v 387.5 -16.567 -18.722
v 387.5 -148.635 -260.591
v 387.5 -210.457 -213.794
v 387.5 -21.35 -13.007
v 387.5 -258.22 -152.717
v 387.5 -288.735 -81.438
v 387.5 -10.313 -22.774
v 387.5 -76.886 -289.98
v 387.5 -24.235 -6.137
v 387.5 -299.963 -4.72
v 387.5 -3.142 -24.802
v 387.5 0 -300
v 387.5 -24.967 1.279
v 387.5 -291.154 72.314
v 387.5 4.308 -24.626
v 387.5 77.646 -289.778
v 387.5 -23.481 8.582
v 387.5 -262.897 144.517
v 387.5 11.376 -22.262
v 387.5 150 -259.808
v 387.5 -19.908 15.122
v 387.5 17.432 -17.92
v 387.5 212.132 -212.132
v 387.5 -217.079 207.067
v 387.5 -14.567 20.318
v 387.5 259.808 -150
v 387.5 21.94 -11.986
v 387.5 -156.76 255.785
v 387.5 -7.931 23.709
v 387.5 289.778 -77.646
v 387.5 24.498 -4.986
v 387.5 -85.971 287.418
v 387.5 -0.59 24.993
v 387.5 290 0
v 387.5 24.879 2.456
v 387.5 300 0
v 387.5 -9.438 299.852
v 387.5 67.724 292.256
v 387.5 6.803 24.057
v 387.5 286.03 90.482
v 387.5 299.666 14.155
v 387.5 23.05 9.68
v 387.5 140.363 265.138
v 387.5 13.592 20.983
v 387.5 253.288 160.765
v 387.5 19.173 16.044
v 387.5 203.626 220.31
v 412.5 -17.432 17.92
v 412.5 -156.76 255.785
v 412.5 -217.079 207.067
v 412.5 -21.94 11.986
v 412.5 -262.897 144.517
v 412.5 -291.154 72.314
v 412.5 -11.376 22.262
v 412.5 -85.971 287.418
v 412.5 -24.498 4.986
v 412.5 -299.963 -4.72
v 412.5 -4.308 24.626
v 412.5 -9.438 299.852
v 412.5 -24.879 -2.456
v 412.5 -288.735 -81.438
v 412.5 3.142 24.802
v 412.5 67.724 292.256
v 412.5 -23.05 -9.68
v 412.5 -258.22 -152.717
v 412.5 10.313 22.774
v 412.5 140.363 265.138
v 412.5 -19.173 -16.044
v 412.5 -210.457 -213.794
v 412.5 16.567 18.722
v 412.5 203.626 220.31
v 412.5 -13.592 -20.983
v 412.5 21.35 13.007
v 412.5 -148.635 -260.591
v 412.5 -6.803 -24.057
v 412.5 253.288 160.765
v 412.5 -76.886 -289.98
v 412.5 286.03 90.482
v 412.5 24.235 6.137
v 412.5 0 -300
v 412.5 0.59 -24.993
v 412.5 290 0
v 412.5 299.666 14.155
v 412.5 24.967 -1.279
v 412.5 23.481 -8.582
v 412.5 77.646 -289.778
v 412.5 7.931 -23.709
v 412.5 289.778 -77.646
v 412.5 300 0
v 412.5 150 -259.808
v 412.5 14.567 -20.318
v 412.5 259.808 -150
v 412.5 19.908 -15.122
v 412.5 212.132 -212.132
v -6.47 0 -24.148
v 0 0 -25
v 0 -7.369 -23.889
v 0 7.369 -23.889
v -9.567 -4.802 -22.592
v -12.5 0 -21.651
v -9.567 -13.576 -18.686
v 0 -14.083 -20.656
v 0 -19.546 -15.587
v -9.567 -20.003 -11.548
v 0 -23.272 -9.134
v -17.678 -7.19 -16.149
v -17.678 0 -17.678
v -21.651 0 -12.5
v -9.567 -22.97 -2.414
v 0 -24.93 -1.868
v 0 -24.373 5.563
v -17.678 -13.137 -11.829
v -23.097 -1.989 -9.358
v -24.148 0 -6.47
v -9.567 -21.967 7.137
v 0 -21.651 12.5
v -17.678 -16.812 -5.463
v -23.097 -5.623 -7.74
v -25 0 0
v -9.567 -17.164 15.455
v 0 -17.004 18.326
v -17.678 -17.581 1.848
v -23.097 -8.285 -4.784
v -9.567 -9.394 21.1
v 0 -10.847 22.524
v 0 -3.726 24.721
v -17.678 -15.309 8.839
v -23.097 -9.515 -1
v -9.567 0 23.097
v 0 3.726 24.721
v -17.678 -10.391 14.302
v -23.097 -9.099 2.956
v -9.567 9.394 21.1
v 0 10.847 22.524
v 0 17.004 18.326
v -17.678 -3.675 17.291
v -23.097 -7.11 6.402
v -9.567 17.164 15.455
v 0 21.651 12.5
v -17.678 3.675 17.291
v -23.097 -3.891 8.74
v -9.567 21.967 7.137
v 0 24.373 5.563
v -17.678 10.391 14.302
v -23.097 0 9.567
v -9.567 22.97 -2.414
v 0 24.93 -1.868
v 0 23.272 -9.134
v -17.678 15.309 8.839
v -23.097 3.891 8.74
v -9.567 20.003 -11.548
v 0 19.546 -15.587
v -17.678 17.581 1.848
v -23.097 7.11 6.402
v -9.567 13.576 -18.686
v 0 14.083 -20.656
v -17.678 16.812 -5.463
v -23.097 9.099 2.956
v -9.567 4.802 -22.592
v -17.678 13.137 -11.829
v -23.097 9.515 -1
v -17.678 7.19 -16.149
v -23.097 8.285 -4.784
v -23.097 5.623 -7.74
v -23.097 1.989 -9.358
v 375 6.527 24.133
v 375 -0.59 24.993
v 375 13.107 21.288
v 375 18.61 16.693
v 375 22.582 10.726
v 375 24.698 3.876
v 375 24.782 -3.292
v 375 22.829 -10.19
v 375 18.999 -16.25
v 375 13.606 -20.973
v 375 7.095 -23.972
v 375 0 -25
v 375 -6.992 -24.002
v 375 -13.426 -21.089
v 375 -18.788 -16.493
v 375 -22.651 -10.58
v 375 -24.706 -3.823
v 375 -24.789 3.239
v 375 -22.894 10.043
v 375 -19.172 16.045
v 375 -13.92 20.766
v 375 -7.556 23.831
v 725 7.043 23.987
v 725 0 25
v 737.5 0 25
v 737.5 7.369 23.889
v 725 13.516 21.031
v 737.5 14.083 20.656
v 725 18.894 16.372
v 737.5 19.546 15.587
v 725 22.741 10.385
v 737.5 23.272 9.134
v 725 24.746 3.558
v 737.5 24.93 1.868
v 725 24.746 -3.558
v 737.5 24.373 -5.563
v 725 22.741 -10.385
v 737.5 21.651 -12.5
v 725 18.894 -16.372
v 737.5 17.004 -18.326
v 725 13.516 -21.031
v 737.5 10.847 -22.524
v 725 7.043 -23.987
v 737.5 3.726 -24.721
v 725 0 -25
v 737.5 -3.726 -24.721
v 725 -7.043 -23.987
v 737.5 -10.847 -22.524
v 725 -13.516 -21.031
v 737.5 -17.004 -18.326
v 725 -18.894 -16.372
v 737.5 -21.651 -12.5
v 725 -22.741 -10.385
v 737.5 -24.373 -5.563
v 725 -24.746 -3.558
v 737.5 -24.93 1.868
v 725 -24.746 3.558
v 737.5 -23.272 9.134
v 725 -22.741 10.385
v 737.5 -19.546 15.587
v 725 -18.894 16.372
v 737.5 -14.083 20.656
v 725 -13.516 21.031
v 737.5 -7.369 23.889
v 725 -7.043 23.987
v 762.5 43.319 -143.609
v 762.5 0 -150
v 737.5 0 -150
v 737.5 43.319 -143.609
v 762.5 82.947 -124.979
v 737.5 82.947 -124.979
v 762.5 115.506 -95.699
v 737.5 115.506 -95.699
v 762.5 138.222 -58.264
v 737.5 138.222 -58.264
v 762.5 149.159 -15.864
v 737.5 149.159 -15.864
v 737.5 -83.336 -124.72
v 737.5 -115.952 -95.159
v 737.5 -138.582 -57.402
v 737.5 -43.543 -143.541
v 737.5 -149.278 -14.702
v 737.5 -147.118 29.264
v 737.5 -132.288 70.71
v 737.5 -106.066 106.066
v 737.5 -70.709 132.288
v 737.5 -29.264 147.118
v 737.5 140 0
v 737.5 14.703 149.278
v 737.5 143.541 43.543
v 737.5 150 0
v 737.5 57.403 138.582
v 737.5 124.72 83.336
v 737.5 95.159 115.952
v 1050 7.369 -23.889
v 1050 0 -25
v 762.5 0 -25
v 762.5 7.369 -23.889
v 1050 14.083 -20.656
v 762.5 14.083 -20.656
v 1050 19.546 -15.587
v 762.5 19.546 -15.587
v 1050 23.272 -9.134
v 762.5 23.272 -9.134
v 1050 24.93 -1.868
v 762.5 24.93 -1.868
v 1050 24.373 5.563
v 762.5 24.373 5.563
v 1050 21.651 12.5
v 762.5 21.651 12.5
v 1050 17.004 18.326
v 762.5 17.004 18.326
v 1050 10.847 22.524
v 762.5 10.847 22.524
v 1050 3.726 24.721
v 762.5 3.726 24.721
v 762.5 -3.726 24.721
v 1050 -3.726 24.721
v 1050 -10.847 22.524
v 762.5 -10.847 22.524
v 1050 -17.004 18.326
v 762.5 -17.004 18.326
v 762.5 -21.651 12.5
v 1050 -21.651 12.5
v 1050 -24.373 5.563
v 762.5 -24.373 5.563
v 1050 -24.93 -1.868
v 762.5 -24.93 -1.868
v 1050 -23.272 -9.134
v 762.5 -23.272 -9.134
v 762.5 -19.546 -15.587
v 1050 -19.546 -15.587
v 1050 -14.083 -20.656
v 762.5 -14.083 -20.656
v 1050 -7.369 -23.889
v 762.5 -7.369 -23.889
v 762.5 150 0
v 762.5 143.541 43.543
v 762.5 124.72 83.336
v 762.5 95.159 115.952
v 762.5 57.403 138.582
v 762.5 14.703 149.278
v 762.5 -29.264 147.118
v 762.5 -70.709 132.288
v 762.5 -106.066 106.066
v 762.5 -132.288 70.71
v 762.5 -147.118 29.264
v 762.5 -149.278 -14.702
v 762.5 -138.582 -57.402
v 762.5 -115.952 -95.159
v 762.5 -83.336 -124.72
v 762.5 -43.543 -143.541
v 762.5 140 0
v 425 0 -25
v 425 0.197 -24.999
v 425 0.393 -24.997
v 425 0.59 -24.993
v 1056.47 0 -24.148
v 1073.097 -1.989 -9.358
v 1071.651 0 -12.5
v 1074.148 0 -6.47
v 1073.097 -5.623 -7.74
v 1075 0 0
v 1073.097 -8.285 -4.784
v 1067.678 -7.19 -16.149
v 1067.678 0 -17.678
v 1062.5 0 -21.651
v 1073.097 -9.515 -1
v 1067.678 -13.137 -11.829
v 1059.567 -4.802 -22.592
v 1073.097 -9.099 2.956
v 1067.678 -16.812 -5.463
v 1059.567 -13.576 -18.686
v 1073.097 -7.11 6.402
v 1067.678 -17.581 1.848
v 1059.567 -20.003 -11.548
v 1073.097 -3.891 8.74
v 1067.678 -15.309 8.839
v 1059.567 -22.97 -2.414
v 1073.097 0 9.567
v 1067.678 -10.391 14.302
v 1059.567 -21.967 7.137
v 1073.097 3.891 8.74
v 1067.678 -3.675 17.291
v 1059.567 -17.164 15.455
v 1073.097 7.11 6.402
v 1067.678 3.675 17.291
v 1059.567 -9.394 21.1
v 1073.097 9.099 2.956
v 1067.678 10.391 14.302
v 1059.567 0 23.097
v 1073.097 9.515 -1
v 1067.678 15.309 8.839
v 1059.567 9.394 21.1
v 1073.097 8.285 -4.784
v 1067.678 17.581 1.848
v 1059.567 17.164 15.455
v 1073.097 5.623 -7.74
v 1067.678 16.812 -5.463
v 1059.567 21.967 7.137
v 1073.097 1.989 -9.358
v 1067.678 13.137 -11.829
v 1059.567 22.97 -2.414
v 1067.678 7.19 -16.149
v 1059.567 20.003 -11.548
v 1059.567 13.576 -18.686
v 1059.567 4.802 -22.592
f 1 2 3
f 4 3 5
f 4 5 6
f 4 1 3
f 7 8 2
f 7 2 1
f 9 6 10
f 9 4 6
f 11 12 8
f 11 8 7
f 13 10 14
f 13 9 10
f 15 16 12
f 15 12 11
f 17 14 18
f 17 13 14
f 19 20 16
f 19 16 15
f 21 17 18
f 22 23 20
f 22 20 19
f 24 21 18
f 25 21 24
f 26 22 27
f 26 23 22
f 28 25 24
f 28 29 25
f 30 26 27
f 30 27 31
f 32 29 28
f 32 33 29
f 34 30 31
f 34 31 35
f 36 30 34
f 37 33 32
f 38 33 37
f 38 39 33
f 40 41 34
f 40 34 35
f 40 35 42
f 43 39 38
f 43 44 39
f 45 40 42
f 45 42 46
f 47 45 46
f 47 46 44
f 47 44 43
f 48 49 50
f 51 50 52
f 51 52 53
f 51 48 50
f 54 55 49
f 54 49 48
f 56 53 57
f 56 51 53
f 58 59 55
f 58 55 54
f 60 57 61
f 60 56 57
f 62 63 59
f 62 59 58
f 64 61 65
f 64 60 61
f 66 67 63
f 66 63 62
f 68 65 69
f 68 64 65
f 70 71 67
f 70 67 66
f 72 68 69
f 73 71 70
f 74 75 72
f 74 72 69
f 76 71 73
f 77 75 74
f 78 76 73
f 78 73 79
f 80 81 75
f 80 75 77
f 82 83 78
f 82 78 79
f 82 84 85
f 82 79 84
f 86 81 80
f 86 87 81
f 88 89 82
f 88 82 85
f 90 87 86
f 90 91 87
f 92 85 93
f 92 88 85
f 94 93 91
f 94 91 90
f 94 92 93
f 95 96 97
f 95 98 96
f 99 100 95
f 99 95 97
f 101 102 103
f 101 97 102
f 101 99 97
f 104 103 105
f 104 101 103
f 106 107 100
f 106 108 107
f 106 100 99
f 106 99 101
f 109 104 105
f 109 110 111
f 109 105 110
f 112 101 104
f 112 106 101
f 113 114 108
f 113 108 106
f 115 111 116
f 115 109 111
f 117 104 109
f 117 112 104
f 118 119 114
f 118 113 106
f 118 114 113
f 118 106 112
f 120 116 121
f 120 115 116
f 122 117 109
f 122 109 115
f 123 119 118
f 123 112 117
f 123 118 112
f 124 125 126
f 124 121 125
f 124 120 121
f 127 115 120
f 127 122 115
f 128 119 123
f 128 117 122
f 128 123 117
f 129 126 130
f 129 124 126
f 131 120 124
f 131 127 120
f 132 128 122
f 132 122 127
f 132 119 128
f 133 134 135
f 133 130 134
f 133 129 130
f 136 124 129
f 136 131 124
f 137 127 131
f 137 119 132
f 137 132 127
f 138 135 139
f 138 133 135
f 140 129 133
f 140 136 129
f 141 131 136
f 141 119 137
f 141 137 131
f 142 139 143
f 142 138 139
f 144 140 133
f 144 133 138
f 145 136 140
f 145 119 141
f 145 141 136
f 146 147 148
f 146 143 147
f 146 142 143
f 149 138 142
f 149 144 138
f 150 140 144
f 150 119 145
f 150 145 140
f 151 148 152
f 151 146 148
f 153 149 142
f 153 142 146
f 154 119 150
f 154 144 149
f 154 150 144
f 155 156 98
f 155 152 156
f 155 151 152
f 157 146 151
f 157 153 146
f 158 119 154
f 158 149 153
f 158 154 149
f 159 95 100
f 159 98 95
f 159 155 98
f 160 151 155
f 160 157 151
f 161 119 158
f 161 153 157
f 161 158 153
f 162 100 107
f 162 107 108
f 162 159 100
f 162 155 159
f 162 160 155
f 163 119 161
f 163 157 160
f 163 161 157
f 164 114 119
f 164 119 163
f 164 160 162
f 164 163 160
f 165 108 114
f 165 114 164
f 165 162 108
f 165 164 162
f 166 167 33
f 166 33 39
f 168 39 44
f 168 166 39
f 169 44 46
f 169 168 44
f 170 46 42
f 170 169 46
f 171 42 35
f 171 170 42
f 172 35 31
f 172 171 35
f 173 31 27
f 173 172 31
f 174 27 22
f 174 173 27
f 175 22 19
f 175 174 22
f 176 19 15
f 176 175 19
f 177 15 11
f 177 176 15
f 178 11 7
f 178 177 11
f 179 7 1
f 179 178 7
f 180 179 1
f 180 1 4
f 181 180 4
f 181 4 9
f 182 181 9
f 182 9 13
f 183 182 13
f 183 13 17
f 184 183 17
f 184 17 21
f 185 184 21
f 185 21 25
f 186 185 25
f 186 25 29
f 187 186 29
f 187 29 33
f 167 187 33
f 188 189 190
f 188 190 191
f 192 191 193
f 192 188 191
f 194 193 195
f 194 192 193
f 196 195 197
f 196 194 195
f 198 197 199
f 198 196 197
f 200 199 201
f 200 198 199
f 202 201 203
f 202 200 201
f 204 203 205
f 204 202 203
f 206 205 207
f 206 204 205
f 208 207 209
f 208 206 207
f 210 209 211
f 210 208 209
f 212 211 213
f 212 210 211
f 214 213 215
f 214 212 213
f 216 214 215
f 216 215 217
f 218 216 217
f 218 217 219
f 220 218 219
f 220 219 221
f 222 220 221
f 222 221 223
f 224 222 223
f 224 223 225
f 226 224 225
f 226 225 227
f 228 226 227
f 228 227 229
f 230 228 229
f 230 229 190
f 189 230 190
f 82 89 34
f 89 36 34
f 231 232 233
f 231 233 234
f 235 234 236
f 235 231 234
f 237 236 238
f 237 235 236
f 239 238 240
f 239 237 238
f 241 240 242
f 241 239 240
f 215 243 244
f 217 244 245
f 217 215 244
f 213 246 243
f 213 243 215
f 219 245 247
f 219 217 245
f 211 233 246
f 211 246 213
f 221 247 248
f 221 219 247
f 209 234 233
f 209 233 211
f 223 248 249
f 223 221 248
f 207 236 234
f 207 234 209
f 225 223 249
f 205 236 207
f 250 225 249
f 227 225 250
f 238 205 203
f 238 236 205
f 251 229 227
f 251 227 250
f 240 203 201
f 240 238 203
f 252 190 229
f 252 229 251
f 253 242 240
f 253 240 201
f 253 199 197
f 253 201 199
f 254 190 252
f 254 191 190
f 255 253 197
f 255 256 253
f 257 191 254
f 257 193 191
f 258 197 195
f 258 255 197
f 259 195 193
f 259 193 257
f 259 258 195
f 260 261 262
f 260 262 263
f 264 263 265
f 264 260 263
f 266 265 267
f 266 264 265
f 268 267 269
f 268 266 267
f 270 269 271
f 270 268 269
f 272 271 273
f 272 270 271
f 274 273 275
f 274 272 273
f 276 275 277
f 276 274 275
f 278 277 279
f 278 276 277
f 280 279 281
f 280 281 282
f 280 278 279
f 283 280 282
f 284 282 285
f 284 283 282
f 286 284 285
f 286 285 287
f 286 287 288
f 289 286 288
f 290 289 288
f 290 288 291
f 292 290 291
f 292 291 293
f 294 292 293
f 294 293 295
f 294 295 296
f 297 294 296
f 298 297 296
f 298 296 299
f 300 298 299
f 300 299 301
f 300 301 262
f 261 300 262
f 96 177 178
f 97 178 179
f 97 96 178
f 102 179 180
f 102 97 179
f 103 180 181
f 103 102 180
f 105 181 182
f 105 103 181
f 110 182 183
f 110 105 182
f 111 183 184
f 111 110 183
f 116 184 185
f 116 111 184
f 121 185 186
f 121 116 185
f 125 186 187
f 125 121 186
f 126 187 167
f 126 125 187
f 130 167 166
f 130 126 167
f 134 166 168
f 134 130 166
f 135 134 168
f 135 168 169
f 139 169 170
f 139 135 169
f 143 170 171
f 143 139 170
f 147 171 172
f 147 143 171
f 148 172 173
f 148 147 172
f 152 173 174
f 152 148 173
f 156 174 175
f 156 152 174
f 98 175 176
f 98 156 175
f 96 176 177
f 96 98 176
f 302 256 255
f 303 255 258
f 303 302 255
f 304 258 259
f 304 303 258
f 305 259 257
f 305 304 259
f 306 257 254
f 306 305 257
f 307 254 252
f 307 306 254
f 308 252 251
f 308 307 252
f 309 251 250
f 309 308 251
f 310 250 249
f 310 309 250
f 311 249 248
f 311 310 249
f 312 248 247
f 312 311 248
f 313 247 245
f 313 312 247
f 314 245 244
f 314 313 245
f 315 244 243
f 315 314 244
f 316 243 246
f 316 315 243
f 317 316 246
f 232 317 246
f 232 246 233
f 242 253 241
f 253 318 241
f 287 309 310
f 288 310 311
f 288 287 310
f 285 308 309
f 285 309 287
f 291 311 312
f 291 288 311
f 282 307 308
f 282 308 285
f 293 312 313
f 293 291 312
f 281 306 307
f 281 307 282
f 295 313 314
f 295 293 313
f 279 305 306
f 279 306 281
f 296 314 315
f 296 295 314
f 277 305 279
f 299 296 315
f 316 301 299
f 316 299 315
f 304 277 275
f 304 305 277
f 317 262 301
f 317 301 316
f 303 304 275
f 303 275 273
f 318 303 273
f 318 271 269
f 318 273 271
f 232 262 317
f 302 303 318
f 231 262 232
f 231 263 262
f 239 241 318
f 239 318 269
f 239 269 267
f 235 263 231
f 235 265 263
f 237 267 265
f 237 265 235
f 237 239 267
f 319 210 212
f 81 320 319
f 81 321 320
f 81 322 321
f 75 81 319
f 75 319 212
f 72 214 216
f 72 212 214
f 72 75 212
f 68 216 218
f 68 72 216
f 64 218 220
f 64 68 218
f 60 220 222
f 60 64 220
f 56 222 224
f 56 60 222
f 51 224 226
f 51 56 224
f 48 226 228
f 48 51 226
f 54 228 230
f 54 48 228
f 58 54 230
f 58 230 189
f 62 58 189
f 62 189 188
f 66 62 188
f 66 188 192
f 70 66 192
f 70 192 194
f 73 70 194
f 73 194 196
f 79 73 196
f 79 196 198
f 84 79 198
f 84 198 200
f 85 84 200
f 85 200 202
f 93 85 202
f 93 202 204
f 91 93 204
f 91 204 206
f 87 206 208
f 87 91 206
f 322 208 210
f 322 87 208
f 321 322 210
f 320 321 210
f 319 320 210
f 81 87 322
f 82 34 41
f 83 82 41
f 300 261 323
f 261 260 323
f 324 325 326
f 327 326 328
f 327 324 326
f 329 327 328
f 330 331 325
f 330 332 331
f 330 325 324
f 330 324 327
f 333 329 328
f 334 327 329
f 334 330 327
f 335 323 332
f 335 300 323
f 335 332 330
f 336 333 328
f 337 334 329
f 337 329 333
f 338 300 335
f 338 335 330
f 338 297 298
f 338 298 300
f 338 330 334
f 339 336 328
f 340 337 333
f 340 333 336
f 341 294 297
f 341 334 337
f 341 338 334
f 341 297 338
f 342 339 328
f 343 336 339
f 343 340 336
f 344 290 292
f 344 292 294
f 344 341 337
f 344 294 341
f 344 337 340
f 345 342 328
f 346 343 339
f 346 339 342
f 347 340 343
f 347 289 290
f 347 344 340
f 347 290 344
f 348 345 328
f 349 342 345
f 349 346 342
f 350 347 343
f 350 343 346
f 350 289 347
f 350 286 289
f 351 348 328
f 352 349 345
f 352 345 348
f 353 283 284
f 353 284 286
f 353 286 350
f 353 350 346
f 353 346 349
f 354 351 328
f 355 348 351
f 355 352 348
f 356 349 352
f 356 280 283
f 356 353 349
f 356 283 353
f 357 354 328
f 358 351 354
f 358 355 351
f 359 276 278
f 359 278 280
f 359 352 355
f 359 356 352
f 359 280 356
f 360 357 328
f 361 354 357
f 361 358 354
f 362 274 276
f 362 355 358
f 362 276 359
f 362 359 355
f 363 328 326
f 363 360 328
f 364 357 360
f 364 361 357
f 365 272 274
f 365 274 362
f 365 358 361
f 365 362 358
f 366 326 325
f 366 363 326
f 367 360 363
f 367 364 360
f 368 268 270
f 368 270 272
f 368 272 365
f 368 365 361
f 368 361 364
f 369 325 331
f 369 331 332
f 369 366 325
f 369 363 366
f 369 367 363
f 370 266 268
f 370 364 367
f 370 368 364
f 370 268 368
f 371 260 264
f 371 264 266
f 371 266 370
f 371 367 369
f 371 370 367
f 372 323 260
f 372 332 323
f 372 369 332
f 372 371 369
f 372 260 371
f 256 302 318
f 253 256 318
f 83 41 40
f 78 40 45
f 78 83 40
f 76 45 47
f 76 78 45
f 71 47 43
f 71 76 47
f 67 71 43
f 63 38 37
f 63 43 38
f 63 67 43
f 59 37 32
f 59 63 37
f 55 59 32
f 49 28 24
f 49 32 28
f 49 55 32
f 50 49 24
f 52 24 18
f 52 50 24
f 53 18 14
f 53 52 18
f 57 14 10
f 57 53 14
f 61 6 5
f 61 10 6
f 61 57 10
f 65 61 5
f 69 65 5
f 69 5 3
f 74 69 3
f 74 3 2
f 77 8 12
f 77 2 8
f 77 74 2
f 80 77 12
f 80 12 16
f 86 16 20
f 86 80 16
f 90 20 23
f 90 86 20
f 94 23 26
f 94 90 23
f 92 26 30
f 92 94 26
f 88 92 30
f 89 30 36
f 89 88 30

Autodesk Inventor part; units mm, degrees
ref_plane "YZ Plane" through (0, 0, 0) normal (1, 0, 0) x (0, 1, 0)
ref_plane "XZ Plane" through (0, 0, 0) normal (0, 1, 0) x (-1, 0, 0)
ref_plane "XY Plane" through (0, 0, 0) normal (0, 0, 1) x (1, 0, 0)
sketch "Sketch1" plane through (0, 0, 0) normal (0, 1, 0) x (-1, 0, 0)
  line L0 (0, 0) -> (-400, 0) construction
  line L1 (-400, 0) -> (-750, 0)
  line L2 (-750, 0) -> (-1050, 0)
  line L3 (-400, 0) -> (-400, -300) construction
  line L4 (-400, -300) -> (-375, -300) construction
  line L5 (-375, -300) -> (-425, -300)
  line L6 (-425, -300) -> (-425, 0)
  line L7 (-425, 0) -> (-375, 0)
  line L8 (-375, 0) -> (-375, -300)
  line L9 (0, 0) -> (-1050, 0)
  line L10 (-1050, 0) -> (-1050, -25)
  line L11 (-1050, -25) -> (0, -25)
  line L12 (0, -25) -> (0, 0)
  arc A0 (0, -25) -> (25, 0) centre (0, 0) ccw
  line L13 (0, 0) -> (25, 0) construction
  line L14 (-750, 0) -> (-750, -150) construction
  line L15 (-750, -150) -> (-725, -150) construction
  line L16 (-725, -150) -> (-775, -150)
  line L17 (-775, -150) -> (-775, 0)
  line L18 (-775, 0) -> (-725, 0)
  line L19 (-725, 0) -> (-725, -150)
  arc A1 (-1075, 0) -> (-1050, -25) centre (-1050, 0) ccw
  line L20 (-1050, 0) -> (-1075, 0)
  line L21 (25, 0) -> (0, 0)
  point P0 (-775, -25)
  point P1 (-725, -25)
  point P2 (-425, -25)
  point P3 (-375, -25)
  dimension "d0" = 400
  dimension "d1" = 350
  dimension "d2" = 300
  dimension "d3" = 300
  dimension "d4" = 25
  dimension "d5" = 50
  dimension "d6" = 1050
  dimension "d7" = 25
  dimension "d8" = 150
  dimension "d9" = 25
  dimension "d10" = 50
revolve "Revolution1" add sketch "Sketch1" angle 360 about axis through (0, 0, 0) along (1, 0, 0)
sketch "Sketch2" plane through (375, 0, 0) normal (-1, 0, 0) x (0, 0, 1)
  circle A0 centre (0, 0) radius 300 projected
  line L0 (0, 300) -> (0, 290)
  line L1 (0, 290) -> (25.5833, 307.4702)
  point P0 (14.1547, 299.6659)
  dimension "d12" = 10
extrude "Extrusion1" cut sketch "Sketch2" against normal blind 284.25 contours A0 L1 L0 picked at (7.8644, 296.5058)
sketch "Sketch3" plane through (775, 0, 0) normal (1, 0, 0) x (0, 0, -1)
  circle A0 centre (0, 0) radius 150 projected
  line L0 (0, 150) -> (0, 140)
  line L1 (0, 140) -> (62.4254, 176.0413)
  point P0 (15.8635, 149.1588)
  dimension "d15" = 10
  dimension "d16" = 60
extrude "Extrusion2" cut sketch "Sketch3" against normal blind 139 contours A0 L1 L0 picked at (8.8167, 146.2616)
sketch "Sketch4" plane through (375, 0, 0) normal (-1, 0, 0) x (0, -0.0235977, 0.9997215)
  line L0 (7.0793, 299.9165) -> (-6.8433, 289.9192) projected
  line L1 (-6.8433, 289.9192) -> (-7.0793, 299.9165) projected
  arc A0 (-7.0793, 299.9165) -> (7.0793, 299.9165) centre (0, 0) ccw projected
  circle A1 centre (0, 0) radius 25 projected
sketch "Sketch5" plane through (425, 0, 0) normal (1, 0, 0) x (0, 0.0235977, -0.9997215)
  line L0 (6.8433, 289.9192) -> (-7.0793, 299.9165) projected
  arc A0 (-7.0793, 299.9165) -> (7.0793, 299.9165) centre (0, 0) ccw projected
  line L1 (7.0793, 299.9165) -> (6.8433, 289.9192) projected
  circle A1 centre (0, 0) radius 25 projected
sketch "Sketch6" plane through (725, 140, 0) normal (-1, 0, 0) x (0, 0, 1)
  line L0 (0, 0) -> (-15.8635, 9.1588) projected
  arc A0 (-15.8635, 9.1588) -> (0, 10) centre (0, -140) ccw projected
  line L1 (0, 10) -> (0, 0) projected
  circle A1 centre (0, -140) radius 25 projected
sketch "Sketch7" plane through (775, 140, 0) normal (1, 0, 0) x (0, 0, -1)
  circle A0 centre (0, -140) radius 25 projected
  line L0 (15.8635, 9.1588) -> (0, 0) projected
  line L1 (0, 0) -> (0, 10) projected
  arc A1 (0, 10) -> (15.8635, 9.1588) centre (0, -140) ccw projected
extrude "Extrusion3" cut sketch "Sketch5" against normal blind 12.5
extrude "Extrusion4" cut sketch "Sketch7" against normal blind 12.5
extrude "Extrusion5" cut sketch "Sketch6" against normal blind 12.5
extrude "Extrusion6" cut sketch "Sketch4" against normal blind 12.5
properties part number "shaft_model_2.5cm" material "Steel"
